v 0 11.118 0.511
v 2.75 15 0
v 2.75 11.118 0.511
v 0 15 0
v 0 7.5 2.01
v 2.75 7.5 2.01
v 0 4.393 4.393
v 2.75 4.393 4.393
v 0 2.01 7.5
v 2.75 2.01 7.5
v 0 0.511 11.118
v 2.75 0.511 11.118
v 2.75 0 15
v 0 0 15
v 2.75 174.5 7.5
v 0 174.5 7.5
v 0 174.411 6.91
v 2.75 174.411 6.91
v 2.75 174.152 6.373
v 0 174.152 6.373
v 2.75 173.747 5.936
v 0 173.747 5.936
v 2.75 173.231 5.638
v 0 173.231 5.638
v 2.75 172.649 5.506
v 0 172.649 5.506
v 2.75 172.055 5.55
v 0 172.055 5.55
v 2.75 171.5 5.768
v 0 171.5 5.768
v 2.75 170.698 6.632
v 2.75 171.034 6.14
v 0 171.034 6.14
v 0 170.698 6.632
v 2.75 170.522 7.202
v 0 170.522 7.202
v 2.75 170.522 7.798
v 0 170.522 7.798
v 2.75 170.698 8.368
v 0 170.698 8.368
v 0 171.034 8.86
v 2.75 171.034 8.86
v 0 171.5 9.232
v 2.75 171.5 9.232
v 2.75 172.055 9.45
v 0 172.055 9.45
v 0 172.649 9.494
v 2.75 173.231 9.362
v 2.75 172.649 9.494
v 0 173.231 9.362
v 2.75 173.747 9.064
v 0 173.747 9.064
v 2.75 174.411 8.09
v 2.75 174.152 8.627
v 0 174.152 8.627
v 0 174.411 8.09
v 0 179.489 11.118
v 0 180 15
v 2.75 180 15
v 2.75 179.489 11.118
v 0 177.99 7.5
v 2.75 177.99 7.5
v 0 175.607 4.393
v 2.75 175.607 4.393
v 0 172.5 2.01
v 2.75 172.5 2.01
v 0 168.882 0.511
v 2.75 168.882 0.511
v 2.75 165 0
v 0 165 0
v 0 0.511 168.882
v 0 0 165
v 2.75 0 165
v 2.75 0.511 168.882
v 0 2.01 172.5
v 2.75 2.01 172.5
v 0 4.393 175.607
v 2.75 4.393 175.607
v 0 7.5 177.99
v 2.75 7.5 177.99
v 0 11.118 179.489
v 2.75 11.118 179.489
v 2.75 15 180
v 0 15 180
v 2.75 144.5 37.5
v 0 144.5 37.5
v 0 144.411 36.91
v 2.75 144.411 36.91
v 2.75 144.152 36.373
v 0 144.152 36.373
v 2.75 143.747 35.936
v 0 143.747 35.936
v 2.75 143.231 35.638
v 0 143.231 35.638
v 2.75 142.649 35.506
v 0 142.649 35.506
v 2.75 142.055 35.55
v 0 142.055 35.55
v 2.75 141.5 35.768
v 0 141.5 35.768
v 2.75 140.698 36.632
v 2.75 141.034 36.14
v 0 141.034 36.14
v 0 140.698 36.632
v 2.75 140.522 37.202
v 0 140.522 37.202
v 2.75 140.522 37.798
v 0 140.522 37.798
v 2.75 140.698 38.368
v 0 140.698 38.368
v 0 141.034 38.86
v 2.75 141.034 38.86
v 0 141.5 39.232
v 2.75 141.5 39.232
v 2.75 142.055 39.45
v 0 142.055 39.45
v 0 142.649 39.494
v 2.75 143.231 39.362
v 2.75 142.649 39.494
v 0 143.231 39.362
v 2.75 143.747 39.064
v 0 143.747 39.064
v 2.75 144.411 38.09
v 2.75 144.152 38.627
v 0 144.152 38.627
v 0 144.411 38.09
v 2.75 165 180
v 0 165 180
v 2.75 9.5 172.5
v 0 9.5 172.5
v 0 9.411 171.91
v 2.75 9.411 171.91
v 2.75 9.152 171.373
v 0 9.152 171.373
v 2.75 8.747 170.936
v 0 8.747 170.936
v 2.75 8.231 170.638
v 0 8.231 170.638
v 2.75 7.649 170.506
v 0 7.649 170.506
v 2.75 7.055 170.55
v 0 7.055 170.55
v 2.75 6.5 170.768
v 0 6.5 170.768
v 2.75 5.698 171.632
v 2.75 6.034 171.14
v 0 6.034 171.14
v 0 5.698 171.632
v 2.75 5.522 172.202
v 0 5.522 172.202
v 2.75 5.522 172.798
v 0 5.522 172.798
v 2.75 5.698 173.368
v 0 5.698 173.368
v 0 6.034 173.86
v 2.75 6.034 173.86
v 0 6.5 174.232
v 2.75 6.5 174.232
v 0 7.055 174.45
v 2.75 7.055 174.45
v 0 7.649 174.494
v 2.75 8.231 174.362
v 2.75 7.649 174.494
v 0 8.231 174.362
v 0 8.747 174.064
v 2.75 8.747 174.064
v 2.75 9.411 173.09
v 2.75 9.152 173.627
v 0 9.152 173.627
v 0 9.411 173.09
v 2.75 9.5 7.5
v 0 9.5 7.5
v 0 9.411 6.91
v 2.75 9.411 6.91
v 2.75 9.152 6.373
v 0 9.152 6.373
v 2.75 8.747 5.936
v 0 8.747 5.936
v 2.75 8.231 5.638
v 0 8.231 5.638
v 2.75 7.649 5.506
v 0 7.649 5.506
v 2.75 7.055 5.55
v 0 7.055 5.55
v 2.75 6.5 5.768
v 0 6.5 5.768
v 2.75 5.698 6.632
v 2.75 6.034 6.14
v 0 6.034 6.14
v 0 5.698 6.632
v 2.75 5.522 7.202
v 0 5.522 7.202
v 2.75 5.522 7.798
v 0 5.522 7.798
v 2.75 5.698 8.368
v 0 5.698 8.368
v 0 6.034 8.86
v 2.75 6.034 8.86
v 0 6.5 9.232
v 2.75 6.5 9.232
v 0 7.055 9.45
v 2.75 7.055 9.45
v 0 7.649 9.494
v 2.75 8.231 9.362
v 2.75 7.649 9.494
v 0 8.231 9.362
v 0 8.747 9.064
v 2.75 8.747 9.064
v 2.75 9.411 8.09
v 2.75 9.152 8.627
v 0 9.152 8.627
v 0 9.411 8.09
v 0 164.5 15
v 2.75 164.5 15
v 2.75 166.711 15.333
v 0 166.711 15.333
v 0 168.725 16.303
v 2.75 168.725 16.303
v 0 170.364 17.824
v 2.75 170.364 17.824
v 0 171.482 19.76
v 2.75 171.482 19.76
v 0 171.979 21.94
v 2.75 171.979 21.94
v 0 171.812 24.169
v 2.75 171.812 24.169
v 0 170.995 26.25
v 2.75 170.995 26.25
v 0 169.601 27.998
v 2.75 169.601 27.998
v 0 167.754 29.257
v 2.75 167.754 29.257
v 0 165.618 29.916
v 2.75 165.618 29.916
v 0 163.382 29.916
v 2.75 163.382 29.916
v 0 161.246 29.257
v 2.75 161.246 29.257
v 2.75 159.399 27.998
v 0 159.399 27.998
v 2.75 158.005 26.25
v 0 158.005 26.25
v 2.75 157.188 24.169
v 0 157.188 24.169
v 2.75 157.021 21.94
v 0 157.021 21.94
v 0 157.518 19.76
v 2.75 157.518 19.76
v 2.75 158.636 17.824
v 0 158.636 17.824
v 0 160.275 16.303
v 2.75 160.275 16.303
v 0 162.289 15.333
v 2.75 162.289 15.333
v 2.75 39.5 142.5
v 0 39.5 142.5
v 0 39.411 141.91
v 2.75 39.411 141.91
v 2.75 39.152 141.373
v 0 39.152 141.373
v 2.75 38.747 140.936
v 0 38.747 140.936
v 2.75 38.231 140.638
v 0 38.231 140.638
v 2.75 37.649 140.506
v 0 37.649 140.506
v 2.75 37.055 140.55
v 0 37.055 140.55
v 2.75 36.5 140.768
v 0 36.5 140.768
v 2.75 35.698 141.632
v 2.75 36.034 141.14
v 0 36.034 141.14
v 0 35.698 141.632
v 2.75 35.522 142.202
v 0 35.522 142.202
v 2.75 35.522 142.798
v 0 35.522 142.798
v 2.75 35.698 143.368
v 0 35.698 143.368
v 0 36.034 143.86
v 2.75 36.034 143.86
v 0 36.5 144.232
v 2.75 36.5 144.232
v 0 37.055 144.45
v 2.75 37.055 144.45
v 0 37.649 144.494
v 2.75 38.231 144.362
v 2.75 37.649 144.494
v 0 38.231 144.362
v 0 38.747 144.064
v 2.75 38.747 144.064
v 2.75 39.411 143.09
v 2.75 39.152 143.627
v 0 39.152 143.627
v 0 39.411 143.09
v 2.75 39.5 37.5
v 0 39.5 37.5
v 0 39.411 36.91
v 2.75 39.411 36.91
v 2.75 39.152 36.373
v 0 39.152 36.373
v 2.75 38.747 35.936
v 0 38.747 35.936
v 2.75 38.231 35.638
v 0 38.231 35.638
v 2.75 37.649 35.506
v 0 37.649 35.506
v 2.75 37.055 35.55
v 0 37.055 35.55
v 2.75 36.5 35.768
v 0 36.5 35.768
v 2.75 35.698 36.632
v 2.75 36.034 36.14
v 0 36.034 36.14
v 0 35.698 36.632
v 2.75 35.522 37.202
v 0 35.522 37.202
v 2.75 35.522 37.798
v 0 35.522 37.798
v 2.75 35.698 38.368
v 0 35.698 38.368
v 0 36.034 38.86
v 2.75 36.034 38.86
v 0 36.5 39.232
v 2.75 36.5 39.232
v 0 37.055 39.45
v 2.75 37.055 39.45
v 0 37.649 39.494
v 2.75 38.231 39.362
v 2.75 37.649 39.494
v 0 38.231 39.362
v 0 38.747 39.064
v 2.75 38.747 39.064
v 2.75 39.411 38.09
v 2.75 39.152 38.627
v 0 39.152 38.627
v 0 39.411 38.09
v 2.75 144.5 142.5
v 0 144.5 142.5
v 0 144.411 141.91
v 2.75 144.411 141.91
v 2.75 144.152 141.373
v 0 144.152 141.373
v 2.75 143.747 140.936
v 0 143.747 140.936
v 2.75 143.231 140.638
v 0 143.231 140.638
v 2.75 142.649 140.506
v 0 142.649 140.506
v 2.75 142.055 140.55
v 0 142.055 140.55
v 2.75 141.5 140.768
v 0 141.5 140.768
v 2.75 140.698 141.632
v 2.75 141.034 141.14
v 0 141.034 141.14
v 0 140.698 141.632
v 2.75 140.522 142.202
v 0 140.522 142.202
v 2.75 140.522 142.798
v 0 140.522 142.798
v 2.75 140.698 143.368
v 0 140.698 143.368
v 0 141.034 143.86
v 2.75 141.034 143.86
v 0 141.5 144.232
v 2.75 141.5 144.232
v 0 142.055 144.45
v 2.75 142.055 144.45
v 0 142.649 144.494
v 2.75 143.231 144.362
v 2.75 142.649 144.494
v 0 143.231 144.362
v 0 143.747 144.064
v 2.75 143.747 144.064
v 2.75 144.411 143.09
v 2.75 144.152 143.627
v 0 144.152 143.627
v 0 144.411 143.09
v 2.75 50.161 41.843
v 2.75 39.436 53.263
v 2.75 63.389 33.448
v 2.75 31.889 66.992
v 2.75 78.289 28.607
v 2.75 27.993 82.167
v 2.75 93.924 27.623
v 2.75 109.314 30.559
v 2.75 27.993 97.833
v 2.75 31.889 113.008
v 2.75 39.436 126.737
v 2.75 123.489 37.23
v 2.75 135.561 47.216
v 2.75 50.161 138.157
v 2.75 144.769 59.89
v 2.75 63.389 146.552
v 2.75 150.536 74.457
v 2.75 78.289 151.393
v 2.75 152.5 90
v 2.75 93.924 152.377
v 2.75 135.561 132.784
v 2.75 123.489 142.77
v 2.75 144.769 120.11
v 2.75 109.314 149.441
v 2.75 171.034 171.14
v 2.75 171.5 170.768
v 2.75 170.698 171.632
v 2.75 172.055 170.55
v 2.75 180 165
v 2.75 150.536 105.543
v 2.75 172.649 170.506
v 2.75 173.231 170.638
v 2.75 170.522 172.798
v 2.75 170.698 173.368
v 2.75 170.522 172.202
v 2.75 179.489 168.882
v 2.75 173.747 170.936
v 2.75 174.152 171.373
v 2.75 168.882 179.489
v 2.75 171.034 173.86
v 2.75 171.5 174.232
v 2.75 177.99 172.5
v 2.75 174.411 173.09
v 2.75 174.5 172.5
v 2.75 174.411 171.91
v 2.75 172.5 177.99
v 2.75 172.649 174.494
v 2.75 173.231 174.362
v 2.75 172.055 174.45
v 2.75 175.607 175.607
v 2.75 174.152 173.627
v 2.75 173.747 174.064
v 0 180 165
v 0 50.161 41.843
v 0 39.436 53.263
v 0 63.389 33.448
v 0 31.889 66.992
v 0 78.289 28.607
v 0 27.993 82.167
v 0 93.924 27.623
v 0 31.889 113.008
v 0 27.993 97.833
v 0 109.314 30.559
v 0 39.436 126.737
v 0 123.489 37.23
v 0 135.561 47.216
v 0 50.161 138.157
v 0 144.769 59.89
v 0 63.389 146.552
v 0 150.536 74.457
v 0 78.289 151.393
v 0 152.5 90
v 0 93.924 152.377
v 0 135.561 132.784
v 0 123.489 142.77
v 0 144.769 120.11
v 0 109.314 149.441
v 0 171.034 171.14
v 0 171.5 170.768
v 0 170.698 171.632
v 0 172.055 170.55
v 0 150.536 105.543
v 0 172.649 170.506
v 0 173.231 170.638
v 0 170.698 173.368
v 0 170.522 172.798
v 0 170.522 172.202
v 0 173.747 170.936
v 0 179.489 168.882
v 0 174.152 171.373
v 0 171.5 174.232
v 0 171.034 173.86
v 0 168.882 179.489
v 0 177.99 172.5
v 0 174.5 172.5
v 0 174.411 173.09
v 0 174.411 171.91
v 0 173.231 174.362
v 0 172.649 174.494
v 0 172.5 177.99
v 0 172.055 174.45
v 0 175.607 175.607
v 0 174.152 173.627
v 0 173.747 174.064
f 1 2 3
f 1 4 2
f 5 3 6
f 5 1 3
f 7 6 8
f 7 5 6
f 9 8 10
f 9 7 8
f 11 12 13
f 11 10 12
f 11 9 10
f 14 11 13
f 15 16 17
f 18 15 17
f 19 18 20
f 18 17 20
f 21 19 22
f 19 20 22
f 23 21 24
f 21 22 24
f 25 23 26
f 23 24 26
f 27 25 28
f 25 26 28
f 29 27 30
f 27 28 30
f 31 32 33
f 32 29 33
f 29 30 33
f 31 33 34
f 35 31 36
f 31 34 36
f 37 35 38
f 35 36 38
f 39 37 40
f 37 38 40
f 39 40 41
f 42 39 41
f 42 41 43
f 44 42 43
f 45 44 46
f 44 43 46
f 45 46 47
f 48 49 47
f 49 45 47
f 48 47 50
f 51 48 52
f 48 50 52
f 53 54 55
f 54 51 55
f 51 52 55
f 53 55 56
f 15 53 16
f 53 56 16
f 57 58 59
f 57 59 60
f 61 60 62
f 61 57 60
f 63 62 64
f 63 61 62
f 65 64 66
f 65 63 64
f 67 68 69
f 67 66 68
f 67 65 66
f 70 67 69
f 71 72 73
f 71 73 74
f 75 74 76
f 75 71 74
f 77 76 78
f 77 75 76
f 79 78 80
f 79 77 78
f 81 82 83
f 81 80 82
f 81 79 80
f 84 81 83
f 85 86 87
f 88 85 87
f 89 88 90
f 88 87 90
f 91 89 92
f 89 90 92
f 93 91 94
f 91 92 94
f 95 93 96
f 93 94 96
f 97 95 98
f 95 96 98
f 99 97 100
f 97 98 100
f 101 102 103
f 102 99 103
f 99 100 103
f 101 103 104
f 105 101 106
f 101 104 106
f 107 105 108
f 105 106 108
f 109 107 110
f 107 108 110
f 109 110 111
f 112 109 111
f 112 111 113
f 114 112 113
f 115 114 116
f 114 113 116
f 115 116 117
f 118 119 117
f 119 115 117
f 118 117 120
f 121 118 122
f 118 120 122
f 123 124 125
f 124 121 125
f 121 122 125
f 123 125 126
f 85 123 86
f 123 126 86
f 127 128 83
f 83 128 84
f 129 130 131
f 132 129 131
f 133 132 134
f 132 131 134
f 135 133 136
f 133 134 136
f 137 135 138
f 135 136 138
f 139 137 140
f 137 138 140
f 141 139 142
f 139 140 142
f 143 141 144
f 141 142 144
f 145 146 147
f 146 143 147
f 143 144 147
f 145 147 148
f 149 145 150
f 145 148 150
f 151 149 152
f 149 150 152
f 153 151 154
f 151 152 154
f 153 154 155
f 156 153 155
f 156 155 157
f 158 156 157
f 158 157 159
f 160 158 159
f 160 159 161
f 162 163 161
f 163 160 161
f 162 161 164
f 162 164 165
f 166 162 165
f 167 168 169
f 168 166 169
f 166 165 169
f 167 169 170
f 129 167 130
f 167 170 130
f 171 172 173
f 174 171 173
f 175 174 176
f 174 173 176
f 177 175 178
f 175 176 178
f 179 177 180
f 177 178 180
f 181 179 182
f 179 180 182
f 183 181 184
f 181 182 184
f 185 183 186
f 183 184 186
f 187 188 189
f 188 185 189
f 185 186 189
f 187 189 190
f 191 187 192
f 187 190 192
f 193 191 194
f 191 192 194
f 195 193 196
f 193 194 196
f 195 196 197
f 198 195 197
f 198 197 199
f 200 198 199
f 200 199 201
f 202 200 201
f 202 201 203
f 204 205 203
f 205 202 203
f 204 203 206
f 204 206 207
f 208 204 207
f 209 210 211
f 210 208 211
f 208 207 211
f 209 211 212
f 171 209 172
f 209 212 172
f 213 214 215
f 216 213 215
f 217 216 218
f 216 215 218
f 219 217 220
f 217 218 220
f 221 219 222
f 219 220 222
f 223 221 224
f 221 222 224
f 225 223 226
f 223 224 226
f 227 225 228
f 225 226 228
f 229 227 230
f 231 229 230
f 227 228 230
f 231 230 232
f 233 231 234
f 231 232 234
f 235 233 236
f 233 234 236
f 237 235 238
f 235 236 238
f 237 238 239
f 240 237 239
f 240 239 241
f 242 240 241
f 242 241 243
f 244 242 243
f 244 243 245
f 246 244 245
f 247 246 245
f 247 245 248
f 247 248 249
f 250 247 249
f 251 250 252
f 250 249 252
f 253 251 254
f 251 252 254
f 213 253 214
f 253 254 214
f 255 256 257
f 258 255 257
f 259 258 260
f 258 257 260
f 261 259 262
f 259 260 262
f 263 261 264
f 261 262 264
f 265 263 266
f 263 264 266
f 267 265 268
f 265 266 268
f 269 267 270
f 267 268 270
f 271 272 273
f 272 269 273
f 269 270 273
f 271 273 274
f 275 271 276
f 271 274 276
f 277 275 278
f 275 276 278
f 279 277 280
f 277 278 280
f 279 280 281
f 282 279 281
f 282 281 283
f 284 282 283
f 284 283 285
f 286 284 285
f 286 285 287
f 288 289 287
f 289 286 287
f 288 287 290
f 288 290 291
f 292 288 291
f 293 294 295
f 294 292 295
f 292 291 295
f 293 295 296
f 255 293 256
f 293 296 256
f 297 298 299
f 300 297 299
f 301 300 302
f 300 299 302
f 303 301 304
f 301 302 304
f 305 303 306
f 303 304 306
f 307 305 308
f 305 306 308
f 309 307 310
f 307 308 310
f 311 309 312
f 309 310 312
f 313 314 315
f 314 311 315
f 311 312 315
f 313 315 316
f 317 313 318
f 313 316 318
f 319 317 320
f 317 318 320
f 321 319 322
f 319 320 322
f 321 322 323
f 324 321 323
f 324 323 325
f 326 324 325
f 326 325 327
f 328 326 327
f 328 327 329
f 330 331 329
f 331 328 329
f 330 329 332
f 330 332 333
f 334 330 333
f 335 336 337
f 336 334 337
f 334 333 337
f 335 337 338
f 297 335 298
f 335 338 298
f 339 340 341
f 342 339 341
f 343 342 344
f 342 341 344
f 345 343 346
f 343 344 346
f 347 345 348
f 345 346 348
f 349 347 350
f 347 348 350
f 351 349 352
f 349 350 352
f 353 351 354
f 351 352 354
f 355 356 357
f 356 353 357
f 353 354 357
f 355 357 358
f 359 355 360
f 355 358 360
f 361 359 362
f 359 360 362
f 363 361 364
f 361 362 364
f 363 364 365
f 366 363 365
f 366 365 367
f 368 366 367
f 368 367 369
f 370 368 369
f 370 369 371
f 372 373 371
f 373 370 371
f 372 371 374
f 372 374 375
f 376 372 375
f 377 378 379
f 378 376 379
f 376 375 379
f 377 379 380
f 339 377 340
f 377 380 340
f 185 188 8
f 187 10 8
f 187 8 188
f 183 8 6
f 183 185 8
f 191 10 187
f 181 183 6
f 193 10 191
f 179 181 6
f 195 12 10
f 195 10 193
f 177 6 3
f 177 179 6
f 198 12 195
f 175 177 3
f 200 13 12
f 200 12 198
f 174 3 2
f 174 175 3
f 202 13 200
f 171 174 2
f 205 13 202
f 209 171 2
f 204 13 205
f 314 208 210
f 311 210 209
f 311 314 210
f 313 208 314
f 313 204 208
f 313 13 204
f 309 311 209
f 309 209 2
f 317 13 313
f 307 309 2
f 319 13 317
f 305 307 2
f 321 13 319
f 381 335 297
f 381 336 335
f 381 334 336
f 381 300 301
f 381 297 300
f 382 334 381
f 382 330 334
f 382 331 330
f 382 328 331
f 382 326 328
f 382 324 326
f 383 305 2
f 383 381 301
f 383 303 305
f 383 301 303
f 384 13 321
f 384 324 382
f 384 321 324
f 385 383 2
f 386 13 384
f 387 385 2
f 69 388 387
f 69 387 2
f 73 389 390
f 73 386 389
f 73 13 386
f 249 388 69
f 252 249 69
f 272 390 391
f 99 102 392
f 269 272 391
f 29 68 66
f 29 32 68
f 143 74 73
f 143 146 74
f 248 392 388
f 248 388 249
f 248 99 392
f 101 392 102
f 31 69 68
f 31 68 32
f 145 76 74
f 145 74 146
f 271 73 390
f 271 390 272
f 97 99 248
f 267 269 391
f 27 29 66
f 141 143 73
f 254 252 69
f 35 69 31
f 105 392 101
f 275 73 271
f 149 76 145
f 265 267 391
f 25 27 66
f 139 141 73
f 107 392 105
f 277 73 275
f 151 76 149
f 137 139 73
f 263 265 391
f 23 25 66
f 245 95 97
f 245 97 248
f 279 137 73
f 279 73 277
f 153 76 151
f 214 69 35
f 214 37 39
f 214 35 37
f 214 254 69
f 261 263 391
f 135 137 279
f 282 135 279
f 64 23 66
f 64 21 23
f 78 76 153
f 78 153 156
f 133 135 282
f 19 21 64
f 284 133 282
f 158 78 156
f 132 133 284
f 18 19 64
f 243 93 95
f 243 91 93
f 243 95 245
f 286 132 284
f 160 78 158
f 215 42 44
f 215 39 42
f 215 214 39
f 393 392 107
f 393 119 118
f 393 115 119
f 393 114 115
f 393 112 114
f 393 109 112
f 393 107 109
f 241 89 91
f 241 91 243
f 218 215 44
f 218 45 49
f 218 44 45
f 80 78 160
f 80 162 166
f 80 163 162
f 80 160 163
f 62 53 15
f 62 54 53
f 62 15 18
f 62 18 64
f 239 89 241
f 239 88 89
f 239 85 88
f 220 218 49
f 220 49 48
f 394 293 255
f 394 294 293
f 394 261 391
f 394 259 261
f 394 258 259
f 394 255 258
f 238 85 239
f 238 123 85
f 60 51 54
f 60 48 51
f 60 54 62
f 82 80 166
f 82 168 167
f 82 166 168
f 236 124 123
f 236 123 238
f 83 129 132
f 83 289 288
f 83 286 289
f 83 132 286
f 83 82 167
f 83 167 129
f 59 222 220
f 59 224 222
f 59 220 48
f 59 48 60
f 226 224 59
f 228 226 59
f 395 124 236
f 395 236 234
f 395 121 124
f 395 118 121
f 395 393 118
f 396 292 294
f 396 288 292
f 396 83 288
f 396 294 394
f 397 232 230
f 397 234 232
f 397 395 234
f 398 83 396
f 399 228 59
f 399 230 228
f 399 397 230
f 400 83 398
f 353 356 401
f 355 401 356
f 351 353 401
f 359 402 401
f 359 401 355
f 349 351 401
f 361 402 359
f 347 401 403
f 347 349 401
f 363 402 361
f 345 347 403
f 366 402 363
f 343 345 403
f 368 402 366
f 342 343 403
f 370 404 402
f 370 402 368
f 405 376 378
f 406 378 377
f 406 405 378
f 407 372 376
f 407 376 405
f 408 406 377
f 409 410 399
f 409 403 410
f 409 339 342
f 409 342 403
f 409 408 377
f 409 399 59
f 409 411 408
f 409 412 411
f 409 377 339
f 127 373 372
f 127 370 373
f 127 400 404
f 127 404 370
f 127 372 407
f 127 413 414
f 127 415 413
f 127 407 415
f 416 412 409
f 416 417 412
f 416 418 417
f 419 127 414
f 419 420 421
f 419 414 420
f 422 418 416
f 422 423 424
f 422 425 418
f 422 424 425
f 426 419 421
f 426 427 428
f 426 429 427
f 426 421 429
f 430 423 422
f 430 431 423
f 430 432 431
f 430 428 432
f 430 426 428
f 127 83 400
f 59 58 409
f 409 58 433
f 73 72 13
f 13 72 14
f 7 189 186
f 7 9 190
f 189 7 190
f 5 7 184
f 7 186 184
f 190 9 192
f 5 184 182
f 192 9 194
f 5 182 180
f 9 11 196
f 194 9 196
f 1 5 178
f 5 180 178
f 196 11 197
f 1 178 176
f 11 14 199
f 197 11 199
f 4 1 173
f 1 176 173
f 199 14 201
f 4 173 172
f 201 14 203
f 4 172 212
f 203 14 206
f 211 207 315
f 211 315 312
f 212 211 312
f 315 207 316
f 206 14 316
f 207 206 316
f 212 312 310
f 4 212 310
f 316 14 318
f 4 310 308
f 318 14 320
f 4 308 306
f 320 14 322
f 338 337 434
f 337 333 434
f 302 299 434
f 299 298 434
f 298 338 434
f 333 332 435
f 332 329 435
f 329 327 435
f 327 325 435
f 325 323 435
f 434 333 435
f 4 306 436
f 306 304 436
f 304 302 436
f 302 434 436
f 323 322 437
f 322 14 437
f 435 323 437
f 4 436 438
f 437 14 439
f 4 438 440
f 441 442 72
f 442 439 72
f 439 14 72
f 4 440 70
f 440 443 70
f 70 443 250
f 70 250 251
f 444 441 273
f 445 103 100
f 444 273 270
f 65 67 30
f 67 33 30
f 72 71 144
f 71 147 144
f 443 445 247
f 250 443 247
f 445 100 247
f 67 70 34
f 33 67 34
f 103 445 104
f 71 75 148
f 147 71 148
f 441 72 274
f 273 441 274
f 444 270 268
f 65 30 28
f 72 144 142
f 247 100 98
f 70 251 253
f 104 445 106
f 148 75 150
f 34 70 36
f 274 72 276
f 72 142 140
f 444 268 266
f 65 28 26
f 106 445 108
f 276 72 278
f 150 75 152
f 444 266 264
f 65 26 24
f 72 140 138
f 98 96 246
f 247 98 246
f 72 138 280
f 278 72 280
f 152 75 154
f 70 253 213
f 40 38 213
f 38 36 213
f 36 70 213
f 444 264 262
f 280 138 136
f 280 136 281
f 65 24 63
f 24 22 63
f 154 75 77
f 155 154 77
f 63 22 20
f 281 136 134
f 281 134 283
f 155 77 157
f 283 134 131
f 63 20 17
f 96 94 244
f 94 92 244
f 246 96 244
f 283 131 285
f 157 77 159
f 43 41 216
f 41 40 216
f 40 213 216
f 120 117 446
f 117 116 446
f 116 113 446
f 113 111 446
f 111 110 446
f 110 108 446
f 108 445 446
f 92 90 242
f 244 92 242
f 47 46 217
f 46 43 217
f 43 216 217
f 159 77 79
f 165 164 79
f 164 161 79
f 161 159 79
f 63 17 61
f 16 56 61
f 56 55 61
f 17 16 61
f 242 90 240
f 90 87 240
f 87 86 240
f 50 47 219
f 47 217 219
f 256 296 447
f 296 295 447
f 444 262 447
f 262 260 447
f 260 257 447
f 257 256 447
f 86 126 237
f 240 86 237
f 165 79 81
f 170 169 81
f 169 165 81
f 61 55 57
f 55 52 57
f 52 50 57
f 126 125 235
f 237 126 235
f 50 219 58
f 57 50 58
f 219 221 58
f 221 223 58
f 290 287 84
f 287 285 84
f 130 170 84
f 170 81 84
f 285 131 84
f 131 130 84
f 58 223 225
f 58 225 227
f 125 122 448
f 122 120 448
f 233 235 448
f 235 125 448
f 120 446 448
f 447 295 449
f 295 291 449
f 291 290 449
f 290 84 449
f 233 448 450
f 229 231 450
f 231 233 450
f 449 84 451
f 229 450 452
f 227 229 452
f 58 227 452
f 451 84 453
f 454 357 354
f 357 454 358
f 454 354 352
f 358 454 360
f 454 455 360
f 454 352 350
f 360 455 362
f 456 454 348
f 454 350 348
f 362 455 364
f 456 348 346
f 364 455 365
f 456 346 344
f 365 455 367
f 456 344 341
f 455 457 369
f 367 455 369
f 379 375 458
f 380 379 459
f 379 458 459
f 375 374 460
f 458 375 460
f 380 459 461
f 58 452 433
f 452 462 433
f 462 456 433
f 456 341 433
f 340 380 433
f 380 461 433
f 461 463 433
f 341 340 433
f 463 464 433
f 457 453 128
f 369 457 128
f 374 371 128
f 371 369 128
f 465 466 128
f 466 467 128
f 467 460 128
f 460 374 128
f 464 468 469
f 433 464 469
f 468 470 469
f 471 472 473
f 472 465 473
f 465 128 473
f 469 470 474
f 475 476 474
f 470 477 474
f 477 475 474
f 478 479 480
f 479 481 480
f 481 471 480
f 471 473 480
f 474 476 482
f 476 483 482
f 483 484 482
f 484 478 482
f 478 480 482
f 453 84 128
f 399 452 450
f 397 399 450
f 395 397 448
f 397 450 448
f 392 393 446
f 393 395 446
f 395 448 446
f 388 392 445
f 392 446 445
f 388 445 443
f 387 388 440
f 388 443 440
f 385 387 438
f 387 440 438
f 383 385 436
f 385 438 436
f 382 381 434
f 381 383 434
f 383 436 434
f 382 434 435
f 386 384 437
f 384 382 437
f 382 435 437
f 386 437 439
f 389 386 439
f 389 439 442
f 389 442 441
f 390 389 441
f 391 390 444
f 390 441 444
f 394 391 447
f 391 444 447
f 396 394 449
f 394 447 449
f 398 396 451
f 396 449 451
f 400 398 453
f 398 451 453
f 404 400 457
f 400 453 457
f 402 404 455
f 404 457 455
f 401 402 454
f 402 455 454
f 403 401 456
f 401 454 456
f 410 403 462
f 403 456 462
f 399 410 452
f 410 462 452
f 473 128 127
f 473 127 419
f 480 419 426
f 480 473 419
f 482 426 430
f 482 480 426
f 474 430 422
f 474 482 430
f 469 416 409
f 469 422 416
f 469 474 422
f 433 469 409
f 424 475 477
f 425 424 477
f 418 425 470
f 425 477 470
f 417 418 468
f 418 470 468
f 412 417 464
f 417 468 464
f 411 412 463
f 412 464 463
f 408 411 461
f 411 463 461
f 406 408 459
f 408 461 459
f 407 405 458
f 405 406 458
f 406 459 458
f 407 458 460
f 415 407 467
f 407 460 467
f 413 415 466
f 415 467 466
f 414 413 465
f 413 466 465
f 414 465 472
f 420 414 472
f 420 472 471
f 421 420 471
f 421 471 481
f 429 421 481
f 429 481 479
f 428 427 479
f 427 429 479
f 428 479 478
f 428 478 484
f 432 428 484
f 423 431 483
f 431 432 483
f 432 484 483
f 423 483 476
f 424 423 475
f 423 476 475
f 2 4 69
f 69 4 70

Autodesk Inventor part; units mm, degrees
ref_plane "YZ Plane" through (0, 0, 0) normal (1, 0, 0) x (0, 1, 0)
ref_plane "XZ Plane" through (0, 0, 0) normal (0, 1, 0) x (-1, 0, 0)
ref_plane "XY Plane" through (0, 0, 0) normal (0, 0, 1) x (1, 0, 0)
sketch "Sketch1" plane through (0, 0, 0) normal (1, 0, 0) x (0, 1, 0)
  line L0 (15, 0) -> (165, 0)
  line L1 (180, 15) -> (180, 165)
  line L2 (165, 180) -> (15, 180)
  line L3 (0, 165) -> (0, 15)
  line L4 (180, 180) -> (0, 0) construction
  line L5 (30, 30) -> (150, 30) construction
  line L6 (150, 30) -> (150, 150) construction
  line L7 (150, 150) -> (30, 150) construction
  line L8 (30, 150) -> (30, 30) construction
  line L9 (30, 30) -> (150, 150) construction
  line L10 (150, 30) -> (30, 150) construction
  line L11 (37.5, 37.5) -> (142.5, 37.5) construction
  line L12 (142.5, 37.5) -> (142.5, 142.5) construction
  line L13 (142.5, 142.5) -> (37.5, 142.5) construction
  line L14 (37.5, 142.5) -> (37.5, 37.5) construction
  line L15 (37.5, 37.5) -> (142.5, 142.5) construction
  line L16 (142.5, 37.5) -> (37.5, 142.5) construction
  circle A0 centre (142.5, 142.5) radius 2
  circle A1 centre (142.5, 37.5) radius 2
  circle A2 centre (37.5, 37.5) radius 2
  circle A3 centre (37.5, 142.5) radius 2
  circle A4 centre (90, 90) radius 62.5
  arc A5 (180, 165) -> (165, 180) centre (165, 165) ccw
  arc A6 (165, 0) -> (180, 15) centre (165, 15) ccw
  arc A7 (0, 15) -> (15, 0) centre (15, 15) ccw
  arc A8 (15, 180) -> (0, 165) centre (15, 165) ccw
  line L17 (7.5, 7.5) -> (172.5, 7.5) construction
  line L18 (172.5, 7.5) -> (172.5, 172.5) construction
  line L19 (172.5, 172.5) -> (7.5, 172.5) construction
  line L20 (7.5, 172.5) -> (7.5, 7.5) construction
  line L21 (7.5, 7.5) -> (172.5, 172.5) construction
  line L22 (172.5, 7.5) -> (7.5, 172.5) construction
  circle A9 centre (172.5, 172.5) radius 2
  circle A10 centre (172.5, 7.5) radius 2
  circle A11 centre (7.5, 7.5) radius 2
  circle A12 centre (7.5, 172.5) radius 2
  dimension "d0" = 180
  dimension "d1" = 180
  dimension "d2" = 120
  dimension "d3" = 105
  dimension "d4" = 4
  dimension "d5" = 125
  dimension "d6" = 15
  dimension "d9" = 4
  dimension "d10" = 165
extrude "Extrusion1" add sketch "Sketch1" along normal blind 2.75
sketch "Sketch2" plane through (2.75, 0, 0) normal (1, 0, 0) x (0, 0, -1)
  circle A0 centre (-22.5, 164.5) radius 7.5
  circle A1 centre (-7.5, 172.5) radius 2 projected
  point P0 (0, 0)
  dimension "d11" = 15
  dimension "d12" = 15
  dimension "d13" = 8
extrude "Extrusion2" cut sketch "Sketch2" against normal blind 10 contours A0
properties part number "TrayPanelD_120mmAdapter"
